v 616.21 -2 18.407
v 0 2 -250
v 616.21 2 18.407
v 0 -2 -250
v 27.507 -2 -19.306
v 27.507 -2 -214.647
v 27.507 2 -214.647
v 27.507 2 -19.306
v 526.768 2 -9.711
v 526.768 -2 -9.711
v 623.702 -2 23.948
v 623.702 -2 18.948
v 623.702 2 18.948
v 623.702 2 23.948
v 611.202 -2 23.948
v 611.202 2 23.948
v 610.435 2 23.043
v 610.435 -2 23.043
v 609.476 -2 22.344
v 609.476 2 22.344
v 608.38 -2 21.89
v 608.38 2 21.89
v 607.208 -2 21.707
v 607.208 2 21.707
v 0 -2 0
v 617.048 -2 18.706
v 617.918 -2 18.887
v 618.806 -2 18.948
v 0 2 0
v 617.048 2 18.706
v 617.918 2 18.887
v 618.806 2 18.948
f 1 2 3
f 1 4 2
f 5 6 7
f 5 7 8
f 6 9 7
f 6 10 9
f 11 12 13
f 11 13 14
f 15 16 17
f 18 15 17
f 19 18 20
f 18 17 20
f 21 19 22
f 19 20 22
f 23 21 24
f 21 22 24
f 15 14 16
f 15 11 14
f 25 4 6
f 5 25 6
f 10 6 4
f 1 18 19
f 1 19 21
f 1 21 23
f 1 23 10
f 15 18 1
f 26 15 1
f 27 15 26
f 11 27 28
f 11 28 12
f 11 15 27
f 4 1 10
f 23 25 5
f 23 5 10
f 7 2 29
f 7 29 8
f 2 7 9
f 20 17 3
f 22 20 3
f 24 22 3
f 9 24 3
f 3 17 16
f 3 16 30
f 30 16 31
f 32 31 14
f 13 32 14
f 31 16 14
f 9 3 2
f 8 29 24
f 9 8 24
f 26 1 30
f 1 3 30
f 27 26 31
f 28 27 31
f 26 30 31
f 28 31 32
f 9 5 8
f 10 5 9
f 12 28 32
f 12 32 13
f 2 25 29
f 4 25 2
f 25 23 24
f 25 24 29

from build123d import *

# Parameters (mm, degrees)
F1_DEPTH    = 2
F2_DEPTH    = 2
F3_DEPTH    = 2
F4_DEPTH    = 2
F5_T1_DEPTH = 4
F6_R        = 6.5


# Not quite as in the source:
# - a fillet or chamfer that OpenCascade refuses, or shapes differently, is made with other operations: its cross-section is extruded or revolved along the edge and cut away or added


with BuildPart() as f1:
    # F0 (on Front) → F1 (new body)
    with BuildSketch(Plane.XZ):
        Polygon((611.2015247345, 21.8497800332), (0, 0), (0, -250), (617.4515247345, 18.9482106362), (611.2015247345, 18.9482106362), align=None)
        Polygon((27.5068562478, -214.647129178), (27.5068562478, -19.3058601132), (526.7680287361, -9.7110727802), align=None, mode=Mode.SUBTRACT)
    extrude(amount=F1_DEPTH)

    # F0 (on Front) → F2 (join)
    with BuildSketch(Plane.XZ):
        Polygon((611.2015247345, 21.8497800332), (0, 0), (0, -250), (617.4515247345, 18.9482106362), (611.2015247345, 18.9482106362), align=None)
        Polygon((27.5068562478, -214.647129178), (27.5068562478, -19.3058601132), (526.7680287361, -9.7110727802), align=None, mode=Mode.SUBTRACT)
    extrude(amount=-F2_DEPTH)

    # F0 (on Front) → F3 (join)
    with BuildSketch(Plane.XZ):
        Polygon((611.2015247345, 23.9482106362), (611.2015247345, 21.8497800332), (611.2015247345, 18.9482106362), (617.4515247345, 18.9482106362), (623.7015247345, 18.9482106362), (623.7015247345, 23.9482106362), align=None)
    extrude(amount=F3_DEPTH)

    # F0 (on Front) → F4 (join)
    with BuildSketch(Plane.XZ):
        Polygon((611.2015247345, 23.9482106362), (611.2015247345, 21.8497800332), (611.2015247345, 18.9482106362), (617.4515247345, 18.9482106362), (623.7015247345, 18.9482106362), (623.7015247345, 23.9482106362), align=None)
    extrude(amount=-F4_DEPTH)

    # F5: fillet of radius 5 on 1 edges, made by hand

    # F5_s2 → F5_t1 (join)
    with BuildSketch(Plane.XZ.offset(-2)):
        with BuildLine():
            ThreePointArc((611.2015247345, 23.9482106362), (609.476442407, 22.3435494733), (607.20803479, 21.7070171746))
            Line((607.20803479, 21.7070171746), (611.2015247345, 21.8497800332))
            Line((611.2015247345, 21.8497800332), (611.2015247345, 23.9482106362))
        make_face()
    extrude(amount=F5_T1_DEPTH)

    # F6
    f6_edges = [f1.edges().sort_by_distance(p)[0] for p in [
        (617.451525, 0, 18.948211),
    ]]
    fillet(f6_edges, radius=F6_R)


solid = f1.part
